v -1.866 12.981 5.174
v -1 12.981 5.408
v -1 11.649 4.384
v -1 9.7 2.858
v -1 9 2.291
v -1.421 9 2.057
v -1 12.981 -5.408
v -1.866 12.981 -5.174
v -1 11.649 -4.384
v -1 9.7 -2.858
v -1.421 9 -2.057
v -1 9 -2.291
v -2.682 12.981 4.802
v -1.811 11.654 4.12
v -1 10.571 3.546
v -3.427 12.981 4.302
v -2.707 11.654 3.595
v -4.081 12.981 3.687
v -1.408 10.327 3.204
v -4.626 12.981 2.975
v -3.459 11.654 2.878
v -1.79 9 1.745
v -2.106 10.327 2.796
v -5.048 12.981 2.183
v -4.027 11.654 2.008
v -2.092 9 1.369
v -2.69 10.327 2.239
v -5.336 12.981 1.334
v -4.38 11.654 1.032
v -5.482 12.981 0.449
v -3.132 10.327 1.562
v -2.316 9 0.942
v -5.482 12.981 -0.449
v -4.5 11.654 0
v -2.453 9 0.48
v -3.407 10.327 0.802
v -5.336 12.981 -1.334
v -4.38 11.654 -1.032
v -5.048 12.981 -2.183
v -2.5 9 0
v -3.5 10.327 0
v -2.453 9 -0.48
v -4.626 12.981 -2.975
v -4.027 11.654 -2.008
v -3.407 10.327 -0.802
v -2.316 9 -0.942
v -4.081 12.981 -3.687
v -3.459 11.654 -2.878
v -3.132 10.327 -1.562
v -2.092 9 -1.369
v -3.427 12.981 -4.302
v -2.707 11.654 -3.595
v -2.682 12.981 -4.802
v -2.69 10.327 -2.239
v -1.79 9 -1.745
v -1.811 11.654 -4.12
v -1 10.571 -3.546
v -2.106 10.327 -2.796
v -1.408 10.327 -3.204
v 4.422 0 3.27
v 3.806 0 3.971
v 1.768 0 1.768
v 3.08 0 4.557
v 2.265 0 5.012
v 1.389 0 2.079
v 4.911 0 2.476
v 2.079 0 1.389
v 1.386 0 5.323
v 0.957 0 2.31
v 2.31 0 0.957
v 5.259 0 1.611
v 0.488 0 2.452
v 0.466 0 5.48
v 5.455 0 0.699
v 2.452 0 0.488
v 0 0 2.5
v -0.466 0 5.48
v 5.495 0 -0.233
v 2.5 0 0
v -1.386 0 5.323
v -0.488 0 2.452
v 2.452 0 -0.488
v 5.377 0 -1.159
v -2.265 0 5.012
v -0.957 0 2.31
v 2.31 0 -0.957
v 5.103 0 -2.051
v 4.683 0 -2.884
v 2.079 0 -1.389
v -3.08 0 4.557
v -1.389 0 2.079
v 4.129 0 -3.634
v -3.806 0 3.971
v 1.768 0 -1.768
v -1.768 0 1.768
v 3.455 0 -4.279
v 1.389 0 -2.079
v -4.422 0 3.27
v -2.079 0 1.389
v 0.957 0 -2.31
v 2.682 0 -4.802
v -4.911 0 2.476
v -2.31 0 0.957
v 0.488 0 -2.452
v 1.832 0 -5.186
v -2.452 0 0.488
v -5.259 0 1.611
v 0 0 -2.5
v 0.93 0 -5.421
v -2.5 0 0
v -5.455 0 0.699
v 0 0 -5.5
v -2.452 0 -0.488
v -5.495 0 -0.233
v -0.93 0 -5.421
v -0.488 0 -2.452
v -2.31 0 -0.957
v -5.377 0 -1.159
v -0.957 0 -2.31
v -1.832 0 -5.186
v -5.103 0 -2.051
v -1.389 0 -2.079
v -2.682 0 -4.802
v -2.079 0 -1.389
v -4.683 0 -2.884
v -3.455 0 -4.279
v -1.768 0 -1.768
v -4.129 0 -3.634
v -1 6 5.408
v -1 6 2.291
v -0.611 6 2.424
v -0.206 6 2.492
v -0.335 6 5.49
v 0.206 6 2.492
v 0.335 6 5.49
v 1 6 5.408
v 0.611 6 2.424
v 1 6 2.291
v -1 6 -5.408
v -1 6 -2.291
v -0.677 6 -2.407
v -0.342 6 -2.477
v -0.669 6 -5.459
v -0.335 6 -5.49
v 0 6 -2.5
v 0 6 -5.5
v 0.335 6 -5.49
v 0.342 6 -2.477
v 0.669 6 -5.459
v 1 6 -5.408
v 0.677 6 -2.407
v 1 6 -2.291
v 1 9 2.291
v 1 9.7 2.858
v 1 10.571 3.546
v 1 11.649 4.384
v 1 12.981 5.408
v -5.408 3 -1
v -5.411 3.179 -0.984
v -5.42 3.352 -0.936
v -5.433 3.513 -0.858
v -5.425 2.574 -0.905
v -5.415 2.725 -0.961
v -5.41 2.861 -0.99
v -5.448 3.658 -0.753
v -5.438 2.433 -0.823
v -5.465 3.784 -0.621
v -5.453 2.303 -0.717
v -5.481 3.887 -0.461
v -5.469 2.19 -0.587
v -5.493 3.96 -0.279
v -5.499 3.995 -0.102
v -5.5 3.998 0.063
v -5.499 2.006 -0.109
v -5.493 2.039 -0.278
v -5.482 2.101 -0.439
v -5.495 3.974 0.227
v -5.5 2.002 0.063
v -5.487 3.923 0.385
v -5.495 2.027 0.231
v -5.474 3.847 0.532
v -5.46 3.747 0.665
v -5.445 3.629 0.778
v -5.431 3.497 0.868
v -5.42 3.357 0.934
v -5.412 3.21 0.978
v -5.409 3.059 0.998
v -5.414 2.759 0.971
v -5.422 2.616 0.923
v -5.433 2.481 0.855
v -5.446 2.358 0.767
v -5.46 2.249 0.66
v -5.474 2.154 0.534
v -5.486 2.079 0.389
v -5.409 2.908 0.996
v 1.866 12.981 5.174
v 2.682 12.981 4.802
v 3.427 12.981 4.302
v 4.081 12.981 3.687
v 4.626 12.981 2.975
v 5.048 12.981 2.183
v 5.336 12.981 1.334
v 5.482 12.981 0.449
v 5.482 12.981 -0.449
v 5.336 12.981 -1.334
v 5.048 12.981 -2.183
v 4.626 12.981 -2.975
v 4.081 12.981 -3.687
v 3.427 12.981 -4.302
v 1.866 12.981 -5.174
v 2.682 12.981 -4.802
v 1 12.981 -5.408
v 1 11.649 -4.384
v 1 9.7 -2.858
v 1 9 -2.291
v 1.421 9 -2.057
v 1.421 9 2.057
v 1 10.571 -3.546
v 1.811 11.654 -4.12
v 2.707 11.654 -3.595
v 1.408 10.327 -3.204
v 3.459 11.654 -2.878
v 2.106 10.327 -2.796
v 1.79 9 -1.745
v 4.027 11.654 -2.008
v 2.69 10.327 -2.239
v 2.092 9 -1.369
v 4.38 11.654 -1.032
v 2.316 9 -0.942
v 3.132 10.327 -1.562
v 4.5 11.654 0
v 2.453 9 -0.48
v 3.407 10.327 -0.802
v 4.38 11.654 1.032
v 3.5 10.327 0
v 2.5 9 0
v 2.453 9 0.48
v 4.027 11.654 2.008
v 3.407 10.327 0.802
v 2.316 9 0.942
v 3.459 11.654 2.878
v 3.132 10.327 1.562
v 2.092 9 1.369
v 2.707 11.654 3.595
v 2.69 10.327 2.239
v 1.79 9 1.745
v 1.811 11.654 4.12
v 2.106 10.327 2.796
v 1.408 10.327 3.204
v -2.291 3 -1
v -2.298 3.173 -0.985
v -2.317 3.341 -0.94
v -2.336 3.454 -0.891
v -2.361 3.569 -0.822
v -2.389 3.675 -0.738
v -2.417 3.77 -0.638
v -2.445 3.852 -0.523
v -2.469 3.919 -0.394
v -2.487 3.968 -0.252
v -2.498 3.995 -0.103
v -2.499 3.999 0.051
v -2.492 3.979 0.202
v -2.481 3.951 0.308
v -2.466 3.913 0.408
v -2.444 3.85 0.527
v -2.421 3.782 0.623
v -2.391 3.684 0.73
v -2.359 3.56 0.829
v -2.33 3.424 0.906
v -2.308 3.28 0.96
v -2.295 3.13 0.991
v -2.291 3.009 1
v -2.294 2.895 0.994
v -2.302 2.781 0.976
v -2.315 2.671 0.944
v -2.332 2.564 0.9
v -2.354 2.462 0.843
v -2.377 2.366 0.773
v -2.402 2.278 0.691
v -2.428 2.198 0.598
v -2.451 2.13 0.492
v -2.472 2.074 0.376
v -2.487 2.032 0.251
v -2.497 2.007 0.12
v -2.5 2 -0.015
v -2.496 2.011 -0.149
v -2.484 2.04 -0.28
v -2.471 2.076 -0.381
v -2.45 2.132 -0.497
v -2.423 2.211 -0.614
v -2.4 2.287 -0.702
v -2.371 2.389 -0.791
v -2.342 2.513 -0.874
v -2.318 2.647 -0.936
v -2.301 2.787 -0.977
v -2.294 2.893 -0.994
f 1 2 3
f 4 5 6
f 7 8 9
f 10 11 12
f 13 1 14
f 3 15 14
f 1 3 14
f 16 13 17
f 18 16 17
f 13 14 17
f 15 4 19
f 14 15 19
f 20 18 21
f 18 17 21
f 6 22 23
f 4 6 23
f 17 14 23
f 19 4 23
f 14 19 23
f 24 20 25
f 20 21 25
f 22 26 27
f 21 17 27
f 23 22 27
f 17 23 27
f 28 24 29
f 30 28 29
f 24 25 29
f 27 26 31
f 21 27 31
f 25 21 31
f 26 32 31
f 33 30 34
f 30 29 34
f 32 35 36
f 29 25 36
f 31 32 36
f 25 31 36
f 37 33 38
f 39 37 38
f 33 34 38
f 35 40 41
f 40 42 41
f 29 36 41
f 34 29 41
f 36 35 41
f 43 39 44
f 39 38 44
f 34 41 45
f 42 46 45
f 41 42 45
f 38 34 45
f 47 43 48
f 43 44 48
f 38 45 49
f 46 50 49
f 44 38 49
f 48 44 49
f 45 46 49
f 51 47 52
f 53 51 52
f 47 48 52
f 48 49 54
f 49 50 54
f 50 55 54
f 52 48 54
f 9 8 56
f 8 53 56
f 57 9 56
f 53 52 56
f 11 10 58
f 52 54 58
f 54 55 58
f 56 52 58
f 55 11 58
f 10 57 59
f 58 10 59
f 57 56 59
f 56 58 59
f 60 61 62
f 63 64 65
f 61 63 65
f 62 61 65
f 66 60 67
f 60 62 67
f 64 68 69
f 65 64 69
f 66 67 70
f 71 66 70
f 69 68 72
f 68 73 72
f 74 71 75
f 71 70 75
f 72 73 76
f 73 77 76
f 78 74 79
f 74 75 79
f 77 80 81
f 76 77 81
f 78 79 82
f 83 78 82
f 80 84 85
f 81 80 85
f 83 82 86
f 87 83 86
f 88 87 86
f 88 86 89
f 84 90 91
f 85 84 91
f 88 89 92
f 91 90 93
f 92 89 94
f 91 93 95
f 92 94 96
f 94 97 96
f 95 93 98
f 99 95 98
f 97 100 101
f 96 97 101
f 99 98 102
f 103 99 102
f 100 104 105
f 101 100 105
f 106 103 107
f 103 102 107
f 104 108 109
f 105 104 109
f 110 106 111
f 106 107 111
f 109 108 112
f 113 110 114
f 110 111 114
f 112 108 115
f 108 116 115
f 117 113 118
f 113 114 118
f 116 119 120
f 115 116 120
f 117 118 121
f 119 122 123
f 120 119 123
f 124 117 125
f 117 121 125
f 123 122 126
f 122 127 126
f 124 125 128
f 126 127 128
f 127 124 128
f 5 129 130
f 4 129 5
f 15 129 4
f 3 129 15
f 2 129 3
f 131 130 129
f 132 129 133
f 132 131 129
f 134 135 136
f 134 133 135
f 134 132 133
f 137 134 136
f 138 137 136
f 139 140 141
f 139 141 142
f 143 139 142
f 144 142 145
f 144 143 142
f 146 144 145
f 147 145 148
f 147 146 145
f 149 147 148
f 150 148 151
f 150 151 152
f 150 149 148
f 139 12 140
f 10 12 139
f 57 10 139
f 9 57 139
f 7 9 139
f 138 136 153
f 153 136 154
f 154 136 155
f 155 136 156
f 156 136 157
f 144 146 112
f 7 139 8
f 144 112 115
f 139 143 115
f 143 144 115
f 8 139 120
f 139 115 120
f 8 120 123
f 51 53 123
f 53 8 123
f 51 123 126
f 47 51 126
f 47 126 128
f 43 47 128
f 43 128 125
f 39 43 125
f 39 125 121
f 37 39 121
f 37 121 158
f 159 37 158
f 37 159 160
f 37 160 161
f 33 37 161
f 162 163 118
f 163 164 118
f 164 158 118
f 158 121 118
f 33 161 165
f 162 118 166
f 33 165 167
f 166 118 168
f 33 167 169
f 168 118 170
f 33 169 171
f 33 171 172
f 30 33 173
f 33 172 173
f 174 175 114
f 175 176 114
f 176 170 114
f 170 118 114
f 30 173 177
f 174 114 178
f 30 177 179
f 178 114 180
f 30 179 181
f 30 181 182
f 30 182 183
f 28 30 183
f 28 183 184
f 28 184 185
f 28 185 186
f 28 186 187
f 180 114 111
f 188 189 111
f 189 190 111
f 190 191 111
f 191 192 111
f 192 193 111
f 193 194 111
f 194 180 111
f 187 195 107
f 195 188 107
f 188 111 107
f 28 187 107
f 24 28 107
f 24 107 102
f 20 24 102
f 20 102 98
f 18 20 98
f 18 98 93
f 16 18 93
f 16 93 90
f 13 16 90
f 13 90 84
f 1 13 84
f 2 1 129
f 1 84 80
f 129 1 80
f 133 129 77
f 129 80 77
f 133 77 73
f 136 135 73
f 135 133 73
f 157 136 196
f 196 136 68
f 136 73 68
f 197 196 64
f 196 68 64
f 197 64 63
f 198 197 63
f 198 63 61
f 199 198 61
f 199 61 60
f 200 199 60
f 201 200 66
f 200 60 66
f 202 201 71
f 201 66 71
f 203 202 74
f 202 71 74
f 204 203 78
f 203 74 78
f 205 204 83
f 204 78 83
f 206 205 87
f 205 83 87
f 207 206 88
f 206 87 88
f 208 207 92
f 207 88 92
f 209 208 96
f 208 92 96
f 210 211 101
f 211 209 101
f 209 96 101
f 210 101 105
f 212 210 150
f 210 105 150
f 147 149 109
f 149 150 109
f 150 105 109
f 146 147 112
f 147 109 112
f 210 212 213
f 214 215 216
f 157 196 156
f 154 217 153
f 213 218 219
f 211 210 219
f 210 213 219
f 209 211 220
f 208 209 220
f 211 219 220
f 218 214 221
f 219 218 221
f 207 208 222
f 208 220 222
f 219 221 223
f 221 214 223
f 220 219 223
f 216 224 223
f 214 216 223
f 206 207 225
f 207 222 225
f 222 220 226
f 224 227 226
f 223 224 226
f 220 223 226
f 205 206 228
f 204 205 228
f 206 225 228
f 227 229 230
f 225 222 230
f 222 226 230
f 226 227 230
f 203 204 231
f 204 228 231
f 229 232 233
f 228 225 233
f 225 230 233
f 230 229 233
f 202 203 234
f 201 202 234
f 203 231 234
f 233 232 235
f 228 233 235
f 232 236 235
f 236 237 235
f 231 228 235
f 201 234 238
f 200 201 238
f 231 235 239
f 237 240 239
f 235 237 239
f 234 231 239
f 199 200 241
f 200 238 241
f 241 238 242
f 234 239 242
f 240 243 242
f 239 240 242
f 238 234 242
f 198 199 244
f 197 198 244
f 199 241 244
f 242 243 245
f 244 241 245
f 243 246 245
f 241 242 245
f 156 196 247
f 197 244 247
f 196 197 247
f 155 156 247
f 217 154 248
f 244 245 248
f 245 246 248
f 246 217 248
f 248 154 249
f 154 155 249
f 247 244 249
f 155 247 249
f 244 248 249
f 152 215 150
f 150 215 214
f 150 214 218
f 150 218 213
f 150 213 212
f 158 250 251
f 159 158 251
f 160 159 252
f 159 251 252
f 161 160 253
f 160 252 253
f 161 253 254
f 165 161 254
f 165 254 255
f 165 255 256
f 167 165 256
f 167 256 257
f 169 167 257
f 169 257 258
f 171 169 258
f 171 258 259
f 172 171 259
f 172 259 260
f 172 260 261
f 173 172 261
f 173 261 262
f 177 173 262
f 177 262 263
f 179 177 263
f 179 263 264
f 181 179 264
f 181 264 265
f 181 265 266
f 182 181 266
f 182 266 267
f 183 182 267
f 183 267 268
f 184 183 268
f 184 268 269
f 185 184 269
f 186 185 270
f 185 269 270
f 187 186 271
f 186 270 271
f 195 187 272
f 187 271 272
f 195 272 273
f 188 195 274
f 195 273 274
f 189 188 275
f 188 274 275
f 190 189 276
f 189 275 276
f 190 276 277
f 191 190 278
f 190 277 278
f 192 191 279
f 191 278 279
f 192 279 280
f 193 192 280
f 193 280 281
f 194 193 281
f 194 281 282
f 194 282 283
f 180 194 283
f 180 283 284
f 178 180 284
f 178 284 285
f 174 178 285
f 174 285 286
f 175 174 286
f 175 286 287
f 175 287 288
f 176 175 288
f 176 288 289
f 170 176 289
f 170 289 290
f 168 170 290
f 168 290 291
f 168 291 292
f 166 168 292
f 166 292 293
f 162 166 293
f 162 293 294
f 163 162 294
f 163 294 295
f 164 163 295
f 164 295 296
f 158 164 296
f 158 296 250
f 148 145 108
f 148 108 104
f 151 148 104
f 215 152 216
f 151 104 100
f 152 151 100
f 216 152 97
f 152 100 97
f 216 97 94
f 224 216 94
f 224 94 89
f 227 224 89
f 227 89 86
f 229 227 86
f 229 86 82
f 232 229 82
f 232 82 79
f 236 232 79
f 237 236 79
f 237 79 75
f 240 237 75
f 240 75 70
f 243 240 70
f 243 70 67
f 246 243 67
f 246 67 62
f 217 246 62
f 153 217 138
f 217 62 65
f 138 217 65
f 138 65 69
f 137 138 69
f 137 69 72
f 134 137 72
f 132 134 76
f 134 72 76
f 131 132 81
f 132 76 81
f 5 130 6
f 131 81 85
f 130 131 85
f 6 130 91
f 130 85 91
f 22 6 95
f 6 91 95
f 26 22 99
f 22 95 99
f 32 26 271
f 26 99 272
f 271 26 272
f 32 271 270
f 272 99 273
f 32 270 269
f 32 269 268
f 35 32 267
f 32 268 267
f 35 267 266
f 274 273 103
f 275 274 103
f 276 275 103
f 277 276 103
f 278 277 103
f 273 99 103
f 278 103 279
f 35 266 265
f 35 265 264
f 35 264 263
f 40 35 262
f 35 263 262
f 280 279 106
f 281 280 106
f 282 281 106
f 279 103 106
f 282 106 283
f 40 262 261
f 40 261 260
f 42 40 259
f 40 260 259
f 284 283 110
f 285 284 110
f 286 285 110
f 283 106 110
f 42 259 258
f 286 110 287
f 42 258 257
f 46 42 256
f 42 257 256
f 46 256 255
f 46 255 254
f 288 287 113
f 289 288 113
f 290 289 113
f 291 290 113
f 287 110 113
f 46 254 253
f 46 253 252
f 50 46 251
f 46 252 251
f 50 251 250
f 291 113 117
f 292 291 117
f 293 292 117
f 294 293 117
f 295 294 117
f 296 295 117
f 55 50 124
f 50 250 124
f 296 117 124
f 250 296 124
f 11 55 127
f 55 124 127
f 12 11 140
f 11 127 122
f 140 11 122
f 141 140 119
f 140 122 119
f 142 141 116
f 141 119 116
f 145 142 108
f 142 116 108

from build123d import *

# Parameters (mm, degrees)
SKETCH1_R           = 5.5
BOSS_EXTRUDE1_DEPTH = 13
SKETCH2_R           = 2.5
CUT_EXTRUDE1_DEPTH  = 16.149257408
CHAMFER1_SIZE       = 3.0142162
CHAMFER1_SIZE_2     = 4
SKETCH4_W           = 2
SKETCH4_H           = 12
CUT_EXTRUDE2_DEPTH  = 7
SKETCH5_R           = 1
CUT_EXTRUDE3_DEPTH  = 7


with BuildPart() as part:
    # Sketch1 → Boss-Extrude1 (new body)
    with BuildSketch(Plane(origin=(0, 0, 0), x_dir=(1, 0, 0), z_dir=(0, 1, 0))):
        with Locations(Location((0, 0, 0), (0, 0, 90))):
            Circle(SKETCH1_R)
    extrude(amount=BOSS_EXTRUDE1_DEPTH)

    # Sketch2 → Cut-Extrude1 (cut, through all)
    with BuildSketch(Plane.XZ):
        with Locations(Location((0, 0, 0), (0, 0, 270))):
            Circle(SKETCH2_R)
    extrude(amount=-CUT_EXTRUDE1_DEPTH, mode=Mode.SUBTRACT)

    # Chamfer1
    # the kernel refuses this chamfer: 4, 3.0142162 mm, written as the material it takes off along each edge
    with BuildSketch(Plane(origin=(0, 13, 0), x_dir=(0, 0, -1), z_dir=(-1, 0, 0))) as chamfer1_piece_1:
        Polygon((2.5 + CHAMFER1_SIZE, 0), (2.5, CHAMFER1_SIZE_2), (2.5, 0), align=None)
    revolve(axis=Axis((0, 13, 0), (0, -1, 0)), mode=Mode.SUBTRACT)

    # Sketch4 → Cut-Extrude2 (cut)
    with BuildSketch(Plane(origin=(0, 13, 0), x_dir=(1, 0, 0), z_dir=(0, 1, 0))):
        Rectangle(SKETCH4_W, SKETCH4_H)
    extrude(amount=-CUT_EXTRUDE2_DEPTH, mode=Mode.SUBTRACT)

    # Sketch5 → Cut-Extrude3 (cut)
    with BuildSketch(Plane(origin=(0, 0, 0), x_dir=(0, 0, -1), z_dir=(1, 0, 0))):
        with Locations((0, 3)):
            Circle(SKETCH5_R)
    extrude(amount=-CUT_EXTRUDE3_DEPTH, mode=Mode.SUBTRACT)


solid = part.part
